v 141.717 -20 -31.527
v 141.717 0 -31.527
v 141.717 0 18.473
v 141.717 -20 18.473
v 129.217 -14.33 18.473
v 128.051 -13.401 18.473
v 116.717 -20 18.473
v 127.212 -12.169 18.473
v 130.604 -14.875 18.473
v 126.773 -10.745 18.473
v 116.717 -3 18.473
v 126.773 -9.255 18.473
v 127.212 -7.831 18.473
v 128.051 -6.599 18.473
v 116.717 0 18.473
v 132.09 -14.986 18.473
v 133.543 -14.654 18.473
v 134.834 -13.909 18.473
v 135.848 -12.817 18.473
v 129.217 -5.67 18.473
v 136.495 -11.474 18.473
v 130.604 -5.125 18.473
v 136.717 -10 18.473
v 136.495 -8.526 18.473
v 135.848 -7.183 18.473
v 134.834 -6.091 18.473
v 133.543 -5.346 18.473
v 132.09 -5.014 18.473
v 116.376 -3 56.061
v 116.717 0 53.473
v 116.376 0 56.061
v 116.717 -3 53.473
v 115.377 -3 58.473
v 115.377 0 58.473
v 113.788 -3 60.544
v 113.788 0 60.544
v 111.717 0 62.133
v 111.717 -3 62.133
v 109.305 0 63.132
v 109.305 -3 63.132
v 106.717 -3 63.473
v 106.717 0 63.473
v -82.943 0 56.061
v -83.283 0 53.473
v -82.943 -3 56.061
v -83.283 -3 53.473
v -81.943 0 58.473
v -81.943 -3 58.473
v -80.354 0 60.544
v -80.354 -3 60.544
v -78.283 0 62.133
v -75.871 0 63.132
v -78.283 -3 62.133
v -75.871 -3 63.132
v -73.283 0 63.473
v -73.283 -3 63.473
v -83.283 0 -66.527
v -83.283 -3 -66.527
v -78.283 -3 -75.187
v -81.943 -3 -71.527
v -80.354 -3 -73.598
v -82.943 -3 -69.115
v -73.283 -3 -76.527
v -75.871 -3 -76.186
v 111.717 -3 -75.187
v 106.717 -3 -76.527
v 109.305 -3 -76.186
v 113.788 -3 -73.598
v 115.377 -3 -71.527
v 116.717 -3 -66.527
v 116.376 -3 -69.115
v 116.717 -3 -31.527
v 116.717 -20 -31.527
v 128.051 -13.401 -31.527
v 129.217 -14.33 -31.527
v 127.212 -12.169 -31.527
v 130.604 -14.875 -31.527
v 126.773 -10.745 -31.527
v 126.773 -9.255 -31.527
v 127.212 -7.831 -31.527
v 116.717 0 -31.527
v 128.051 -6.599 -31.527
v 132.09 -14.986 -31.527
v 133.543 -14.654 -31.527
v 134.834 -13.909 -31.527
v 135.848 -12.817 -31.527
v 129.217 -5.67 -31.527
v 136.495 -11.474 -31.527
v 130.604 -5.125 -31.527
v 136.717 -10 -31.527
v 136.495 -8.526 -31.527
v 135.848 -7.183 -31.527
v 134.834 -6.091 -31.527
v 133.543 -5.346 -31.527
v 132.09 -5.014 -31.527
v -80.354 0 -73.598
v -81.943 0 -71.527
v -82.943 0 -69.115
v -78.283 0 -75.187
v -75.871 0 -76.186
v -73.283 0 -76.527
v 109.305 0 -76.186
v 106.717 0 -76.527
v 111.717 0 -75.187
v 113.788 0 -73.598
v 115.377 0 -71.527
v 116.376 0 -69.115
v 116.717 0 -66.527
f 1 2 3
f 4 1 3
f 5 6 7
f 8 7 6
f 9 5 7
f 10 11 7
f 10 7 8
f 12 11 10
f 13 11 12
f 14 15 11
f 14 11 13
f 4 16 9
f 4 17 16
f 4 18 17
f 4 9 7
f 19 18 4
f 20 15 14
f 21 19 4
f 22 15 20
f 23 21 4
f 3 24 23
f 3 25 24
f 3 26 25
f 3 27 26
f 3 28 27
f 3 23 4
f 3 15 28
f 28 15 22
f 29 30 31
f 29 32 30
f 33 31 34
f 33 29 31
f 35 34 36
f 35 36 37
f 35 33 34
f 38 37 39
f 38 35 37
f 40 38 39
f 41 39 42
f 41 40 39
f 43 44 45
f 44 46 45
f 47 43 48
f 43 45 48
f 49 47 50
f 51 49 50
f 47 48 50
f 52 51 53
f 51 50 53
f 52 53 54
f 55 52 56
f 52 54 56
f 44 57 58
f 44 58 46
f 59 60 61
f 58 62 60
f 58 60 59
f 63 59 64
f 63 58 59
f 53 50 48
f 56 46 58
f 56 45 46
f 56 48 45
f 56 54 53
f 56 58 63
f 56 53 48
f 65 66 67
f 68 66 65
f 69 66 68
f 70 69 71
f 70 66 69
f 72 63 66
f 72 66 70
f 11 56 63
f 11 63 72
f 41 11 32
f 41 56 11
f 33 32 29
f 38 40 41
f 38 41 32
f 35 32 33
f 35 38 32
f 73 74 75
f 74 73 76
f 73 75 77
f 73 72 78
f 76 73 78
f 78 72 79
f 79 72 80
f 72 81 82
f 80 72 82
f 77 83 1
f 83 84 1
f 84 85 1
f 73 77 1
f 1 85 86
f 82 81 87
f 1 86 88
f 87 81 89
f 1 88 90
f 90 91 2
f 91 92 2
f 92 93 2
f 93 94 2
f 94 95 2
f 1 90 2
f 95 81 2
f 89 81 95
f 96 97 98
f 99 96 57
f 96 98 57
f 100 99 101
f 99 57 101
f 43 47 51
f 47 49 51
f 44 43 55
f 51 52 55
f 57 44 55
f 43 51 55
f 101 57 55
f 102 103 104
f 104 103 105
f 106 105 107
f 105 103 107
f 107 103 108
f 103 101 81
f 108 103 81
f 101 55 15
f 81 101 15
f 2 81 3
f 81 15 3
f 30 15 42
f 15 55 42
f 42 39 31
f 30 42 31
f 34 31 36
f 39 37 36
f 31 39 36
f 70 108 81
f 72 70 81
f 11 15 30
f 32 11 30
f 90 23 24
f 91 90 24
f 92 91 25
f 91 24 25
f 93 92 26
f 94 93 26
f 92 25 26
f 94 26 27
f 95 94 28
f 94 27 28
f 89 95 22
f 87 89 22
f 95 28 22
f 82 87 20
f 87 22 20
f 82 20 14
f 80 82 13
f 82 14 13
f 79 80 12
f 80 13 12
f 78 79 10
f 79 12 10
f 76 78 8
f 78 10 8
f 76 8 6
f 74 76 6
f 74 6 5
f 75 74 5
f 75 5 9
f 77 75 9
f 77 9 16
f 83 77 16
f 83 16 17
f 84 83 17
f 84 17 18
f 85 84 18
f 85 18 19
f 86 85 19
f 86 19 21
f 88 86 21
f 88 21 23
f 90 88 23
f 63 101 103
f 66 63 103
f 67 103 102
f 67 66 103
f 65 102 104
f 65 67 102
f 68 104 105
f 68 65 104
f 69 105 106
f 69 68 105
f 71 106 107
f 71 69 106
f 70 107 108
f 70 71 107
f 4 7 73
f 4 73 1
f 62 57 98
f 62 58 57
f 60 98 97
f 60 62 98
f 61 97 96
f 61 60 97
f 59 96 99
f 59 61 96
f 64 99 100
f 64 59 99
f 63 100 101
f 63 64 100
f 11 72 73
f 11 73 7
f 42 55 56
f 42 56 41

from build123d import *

# Parameters (mm, degrees)
F0_W     = 200
F0_H     = 140
F1_DEPTH = 3
F2_R     = 10
F3_W     = 25
F3_H     = 50
F4_DEPTH = 20
F5_R     = 5
F6_DEPTH = 87.527208


with BuildPart() as f1:
    # F0 (on Front) → F1 (new body)
    with BuildSketch(Plane.XZ):
        with Locations((16.716758, -6.526925)):
            Rectangle(F0_W, F0_H)
    extrude(amount=F1_DEPTH)

    # F2
    f2_edges = [f1.edges().sort_by_distance(p)[0] for p in [
        (-83.283242, -1.5, -76.526925),
        (116.716758, -1.5, 63.473075),
        (116.716758, -1.5, -76.526925),
        (-83.283242, -1.5, 63.473075),
    ]]
    fillet(f2_edges, radius=F2_R)

    # F3 (on Front) → F4 (join)
    with BuildSketch(Plane.XZ):
        with Locations((129.216758, -6.526925)):
            Rectangle(F3_W, F3_H)
    extrude(amount=F4_DEPTH)

    # F5 (on face) → F6 (cut)
    with BuildSketch(Plane.XY.offset(18.473075)):
        with Locations((131.716758, -10)):
            Circle(F5_R)
    extrude(amount=-F6_DEPTH, mode=Mode.SUBTRACT)


solid = f1.part
